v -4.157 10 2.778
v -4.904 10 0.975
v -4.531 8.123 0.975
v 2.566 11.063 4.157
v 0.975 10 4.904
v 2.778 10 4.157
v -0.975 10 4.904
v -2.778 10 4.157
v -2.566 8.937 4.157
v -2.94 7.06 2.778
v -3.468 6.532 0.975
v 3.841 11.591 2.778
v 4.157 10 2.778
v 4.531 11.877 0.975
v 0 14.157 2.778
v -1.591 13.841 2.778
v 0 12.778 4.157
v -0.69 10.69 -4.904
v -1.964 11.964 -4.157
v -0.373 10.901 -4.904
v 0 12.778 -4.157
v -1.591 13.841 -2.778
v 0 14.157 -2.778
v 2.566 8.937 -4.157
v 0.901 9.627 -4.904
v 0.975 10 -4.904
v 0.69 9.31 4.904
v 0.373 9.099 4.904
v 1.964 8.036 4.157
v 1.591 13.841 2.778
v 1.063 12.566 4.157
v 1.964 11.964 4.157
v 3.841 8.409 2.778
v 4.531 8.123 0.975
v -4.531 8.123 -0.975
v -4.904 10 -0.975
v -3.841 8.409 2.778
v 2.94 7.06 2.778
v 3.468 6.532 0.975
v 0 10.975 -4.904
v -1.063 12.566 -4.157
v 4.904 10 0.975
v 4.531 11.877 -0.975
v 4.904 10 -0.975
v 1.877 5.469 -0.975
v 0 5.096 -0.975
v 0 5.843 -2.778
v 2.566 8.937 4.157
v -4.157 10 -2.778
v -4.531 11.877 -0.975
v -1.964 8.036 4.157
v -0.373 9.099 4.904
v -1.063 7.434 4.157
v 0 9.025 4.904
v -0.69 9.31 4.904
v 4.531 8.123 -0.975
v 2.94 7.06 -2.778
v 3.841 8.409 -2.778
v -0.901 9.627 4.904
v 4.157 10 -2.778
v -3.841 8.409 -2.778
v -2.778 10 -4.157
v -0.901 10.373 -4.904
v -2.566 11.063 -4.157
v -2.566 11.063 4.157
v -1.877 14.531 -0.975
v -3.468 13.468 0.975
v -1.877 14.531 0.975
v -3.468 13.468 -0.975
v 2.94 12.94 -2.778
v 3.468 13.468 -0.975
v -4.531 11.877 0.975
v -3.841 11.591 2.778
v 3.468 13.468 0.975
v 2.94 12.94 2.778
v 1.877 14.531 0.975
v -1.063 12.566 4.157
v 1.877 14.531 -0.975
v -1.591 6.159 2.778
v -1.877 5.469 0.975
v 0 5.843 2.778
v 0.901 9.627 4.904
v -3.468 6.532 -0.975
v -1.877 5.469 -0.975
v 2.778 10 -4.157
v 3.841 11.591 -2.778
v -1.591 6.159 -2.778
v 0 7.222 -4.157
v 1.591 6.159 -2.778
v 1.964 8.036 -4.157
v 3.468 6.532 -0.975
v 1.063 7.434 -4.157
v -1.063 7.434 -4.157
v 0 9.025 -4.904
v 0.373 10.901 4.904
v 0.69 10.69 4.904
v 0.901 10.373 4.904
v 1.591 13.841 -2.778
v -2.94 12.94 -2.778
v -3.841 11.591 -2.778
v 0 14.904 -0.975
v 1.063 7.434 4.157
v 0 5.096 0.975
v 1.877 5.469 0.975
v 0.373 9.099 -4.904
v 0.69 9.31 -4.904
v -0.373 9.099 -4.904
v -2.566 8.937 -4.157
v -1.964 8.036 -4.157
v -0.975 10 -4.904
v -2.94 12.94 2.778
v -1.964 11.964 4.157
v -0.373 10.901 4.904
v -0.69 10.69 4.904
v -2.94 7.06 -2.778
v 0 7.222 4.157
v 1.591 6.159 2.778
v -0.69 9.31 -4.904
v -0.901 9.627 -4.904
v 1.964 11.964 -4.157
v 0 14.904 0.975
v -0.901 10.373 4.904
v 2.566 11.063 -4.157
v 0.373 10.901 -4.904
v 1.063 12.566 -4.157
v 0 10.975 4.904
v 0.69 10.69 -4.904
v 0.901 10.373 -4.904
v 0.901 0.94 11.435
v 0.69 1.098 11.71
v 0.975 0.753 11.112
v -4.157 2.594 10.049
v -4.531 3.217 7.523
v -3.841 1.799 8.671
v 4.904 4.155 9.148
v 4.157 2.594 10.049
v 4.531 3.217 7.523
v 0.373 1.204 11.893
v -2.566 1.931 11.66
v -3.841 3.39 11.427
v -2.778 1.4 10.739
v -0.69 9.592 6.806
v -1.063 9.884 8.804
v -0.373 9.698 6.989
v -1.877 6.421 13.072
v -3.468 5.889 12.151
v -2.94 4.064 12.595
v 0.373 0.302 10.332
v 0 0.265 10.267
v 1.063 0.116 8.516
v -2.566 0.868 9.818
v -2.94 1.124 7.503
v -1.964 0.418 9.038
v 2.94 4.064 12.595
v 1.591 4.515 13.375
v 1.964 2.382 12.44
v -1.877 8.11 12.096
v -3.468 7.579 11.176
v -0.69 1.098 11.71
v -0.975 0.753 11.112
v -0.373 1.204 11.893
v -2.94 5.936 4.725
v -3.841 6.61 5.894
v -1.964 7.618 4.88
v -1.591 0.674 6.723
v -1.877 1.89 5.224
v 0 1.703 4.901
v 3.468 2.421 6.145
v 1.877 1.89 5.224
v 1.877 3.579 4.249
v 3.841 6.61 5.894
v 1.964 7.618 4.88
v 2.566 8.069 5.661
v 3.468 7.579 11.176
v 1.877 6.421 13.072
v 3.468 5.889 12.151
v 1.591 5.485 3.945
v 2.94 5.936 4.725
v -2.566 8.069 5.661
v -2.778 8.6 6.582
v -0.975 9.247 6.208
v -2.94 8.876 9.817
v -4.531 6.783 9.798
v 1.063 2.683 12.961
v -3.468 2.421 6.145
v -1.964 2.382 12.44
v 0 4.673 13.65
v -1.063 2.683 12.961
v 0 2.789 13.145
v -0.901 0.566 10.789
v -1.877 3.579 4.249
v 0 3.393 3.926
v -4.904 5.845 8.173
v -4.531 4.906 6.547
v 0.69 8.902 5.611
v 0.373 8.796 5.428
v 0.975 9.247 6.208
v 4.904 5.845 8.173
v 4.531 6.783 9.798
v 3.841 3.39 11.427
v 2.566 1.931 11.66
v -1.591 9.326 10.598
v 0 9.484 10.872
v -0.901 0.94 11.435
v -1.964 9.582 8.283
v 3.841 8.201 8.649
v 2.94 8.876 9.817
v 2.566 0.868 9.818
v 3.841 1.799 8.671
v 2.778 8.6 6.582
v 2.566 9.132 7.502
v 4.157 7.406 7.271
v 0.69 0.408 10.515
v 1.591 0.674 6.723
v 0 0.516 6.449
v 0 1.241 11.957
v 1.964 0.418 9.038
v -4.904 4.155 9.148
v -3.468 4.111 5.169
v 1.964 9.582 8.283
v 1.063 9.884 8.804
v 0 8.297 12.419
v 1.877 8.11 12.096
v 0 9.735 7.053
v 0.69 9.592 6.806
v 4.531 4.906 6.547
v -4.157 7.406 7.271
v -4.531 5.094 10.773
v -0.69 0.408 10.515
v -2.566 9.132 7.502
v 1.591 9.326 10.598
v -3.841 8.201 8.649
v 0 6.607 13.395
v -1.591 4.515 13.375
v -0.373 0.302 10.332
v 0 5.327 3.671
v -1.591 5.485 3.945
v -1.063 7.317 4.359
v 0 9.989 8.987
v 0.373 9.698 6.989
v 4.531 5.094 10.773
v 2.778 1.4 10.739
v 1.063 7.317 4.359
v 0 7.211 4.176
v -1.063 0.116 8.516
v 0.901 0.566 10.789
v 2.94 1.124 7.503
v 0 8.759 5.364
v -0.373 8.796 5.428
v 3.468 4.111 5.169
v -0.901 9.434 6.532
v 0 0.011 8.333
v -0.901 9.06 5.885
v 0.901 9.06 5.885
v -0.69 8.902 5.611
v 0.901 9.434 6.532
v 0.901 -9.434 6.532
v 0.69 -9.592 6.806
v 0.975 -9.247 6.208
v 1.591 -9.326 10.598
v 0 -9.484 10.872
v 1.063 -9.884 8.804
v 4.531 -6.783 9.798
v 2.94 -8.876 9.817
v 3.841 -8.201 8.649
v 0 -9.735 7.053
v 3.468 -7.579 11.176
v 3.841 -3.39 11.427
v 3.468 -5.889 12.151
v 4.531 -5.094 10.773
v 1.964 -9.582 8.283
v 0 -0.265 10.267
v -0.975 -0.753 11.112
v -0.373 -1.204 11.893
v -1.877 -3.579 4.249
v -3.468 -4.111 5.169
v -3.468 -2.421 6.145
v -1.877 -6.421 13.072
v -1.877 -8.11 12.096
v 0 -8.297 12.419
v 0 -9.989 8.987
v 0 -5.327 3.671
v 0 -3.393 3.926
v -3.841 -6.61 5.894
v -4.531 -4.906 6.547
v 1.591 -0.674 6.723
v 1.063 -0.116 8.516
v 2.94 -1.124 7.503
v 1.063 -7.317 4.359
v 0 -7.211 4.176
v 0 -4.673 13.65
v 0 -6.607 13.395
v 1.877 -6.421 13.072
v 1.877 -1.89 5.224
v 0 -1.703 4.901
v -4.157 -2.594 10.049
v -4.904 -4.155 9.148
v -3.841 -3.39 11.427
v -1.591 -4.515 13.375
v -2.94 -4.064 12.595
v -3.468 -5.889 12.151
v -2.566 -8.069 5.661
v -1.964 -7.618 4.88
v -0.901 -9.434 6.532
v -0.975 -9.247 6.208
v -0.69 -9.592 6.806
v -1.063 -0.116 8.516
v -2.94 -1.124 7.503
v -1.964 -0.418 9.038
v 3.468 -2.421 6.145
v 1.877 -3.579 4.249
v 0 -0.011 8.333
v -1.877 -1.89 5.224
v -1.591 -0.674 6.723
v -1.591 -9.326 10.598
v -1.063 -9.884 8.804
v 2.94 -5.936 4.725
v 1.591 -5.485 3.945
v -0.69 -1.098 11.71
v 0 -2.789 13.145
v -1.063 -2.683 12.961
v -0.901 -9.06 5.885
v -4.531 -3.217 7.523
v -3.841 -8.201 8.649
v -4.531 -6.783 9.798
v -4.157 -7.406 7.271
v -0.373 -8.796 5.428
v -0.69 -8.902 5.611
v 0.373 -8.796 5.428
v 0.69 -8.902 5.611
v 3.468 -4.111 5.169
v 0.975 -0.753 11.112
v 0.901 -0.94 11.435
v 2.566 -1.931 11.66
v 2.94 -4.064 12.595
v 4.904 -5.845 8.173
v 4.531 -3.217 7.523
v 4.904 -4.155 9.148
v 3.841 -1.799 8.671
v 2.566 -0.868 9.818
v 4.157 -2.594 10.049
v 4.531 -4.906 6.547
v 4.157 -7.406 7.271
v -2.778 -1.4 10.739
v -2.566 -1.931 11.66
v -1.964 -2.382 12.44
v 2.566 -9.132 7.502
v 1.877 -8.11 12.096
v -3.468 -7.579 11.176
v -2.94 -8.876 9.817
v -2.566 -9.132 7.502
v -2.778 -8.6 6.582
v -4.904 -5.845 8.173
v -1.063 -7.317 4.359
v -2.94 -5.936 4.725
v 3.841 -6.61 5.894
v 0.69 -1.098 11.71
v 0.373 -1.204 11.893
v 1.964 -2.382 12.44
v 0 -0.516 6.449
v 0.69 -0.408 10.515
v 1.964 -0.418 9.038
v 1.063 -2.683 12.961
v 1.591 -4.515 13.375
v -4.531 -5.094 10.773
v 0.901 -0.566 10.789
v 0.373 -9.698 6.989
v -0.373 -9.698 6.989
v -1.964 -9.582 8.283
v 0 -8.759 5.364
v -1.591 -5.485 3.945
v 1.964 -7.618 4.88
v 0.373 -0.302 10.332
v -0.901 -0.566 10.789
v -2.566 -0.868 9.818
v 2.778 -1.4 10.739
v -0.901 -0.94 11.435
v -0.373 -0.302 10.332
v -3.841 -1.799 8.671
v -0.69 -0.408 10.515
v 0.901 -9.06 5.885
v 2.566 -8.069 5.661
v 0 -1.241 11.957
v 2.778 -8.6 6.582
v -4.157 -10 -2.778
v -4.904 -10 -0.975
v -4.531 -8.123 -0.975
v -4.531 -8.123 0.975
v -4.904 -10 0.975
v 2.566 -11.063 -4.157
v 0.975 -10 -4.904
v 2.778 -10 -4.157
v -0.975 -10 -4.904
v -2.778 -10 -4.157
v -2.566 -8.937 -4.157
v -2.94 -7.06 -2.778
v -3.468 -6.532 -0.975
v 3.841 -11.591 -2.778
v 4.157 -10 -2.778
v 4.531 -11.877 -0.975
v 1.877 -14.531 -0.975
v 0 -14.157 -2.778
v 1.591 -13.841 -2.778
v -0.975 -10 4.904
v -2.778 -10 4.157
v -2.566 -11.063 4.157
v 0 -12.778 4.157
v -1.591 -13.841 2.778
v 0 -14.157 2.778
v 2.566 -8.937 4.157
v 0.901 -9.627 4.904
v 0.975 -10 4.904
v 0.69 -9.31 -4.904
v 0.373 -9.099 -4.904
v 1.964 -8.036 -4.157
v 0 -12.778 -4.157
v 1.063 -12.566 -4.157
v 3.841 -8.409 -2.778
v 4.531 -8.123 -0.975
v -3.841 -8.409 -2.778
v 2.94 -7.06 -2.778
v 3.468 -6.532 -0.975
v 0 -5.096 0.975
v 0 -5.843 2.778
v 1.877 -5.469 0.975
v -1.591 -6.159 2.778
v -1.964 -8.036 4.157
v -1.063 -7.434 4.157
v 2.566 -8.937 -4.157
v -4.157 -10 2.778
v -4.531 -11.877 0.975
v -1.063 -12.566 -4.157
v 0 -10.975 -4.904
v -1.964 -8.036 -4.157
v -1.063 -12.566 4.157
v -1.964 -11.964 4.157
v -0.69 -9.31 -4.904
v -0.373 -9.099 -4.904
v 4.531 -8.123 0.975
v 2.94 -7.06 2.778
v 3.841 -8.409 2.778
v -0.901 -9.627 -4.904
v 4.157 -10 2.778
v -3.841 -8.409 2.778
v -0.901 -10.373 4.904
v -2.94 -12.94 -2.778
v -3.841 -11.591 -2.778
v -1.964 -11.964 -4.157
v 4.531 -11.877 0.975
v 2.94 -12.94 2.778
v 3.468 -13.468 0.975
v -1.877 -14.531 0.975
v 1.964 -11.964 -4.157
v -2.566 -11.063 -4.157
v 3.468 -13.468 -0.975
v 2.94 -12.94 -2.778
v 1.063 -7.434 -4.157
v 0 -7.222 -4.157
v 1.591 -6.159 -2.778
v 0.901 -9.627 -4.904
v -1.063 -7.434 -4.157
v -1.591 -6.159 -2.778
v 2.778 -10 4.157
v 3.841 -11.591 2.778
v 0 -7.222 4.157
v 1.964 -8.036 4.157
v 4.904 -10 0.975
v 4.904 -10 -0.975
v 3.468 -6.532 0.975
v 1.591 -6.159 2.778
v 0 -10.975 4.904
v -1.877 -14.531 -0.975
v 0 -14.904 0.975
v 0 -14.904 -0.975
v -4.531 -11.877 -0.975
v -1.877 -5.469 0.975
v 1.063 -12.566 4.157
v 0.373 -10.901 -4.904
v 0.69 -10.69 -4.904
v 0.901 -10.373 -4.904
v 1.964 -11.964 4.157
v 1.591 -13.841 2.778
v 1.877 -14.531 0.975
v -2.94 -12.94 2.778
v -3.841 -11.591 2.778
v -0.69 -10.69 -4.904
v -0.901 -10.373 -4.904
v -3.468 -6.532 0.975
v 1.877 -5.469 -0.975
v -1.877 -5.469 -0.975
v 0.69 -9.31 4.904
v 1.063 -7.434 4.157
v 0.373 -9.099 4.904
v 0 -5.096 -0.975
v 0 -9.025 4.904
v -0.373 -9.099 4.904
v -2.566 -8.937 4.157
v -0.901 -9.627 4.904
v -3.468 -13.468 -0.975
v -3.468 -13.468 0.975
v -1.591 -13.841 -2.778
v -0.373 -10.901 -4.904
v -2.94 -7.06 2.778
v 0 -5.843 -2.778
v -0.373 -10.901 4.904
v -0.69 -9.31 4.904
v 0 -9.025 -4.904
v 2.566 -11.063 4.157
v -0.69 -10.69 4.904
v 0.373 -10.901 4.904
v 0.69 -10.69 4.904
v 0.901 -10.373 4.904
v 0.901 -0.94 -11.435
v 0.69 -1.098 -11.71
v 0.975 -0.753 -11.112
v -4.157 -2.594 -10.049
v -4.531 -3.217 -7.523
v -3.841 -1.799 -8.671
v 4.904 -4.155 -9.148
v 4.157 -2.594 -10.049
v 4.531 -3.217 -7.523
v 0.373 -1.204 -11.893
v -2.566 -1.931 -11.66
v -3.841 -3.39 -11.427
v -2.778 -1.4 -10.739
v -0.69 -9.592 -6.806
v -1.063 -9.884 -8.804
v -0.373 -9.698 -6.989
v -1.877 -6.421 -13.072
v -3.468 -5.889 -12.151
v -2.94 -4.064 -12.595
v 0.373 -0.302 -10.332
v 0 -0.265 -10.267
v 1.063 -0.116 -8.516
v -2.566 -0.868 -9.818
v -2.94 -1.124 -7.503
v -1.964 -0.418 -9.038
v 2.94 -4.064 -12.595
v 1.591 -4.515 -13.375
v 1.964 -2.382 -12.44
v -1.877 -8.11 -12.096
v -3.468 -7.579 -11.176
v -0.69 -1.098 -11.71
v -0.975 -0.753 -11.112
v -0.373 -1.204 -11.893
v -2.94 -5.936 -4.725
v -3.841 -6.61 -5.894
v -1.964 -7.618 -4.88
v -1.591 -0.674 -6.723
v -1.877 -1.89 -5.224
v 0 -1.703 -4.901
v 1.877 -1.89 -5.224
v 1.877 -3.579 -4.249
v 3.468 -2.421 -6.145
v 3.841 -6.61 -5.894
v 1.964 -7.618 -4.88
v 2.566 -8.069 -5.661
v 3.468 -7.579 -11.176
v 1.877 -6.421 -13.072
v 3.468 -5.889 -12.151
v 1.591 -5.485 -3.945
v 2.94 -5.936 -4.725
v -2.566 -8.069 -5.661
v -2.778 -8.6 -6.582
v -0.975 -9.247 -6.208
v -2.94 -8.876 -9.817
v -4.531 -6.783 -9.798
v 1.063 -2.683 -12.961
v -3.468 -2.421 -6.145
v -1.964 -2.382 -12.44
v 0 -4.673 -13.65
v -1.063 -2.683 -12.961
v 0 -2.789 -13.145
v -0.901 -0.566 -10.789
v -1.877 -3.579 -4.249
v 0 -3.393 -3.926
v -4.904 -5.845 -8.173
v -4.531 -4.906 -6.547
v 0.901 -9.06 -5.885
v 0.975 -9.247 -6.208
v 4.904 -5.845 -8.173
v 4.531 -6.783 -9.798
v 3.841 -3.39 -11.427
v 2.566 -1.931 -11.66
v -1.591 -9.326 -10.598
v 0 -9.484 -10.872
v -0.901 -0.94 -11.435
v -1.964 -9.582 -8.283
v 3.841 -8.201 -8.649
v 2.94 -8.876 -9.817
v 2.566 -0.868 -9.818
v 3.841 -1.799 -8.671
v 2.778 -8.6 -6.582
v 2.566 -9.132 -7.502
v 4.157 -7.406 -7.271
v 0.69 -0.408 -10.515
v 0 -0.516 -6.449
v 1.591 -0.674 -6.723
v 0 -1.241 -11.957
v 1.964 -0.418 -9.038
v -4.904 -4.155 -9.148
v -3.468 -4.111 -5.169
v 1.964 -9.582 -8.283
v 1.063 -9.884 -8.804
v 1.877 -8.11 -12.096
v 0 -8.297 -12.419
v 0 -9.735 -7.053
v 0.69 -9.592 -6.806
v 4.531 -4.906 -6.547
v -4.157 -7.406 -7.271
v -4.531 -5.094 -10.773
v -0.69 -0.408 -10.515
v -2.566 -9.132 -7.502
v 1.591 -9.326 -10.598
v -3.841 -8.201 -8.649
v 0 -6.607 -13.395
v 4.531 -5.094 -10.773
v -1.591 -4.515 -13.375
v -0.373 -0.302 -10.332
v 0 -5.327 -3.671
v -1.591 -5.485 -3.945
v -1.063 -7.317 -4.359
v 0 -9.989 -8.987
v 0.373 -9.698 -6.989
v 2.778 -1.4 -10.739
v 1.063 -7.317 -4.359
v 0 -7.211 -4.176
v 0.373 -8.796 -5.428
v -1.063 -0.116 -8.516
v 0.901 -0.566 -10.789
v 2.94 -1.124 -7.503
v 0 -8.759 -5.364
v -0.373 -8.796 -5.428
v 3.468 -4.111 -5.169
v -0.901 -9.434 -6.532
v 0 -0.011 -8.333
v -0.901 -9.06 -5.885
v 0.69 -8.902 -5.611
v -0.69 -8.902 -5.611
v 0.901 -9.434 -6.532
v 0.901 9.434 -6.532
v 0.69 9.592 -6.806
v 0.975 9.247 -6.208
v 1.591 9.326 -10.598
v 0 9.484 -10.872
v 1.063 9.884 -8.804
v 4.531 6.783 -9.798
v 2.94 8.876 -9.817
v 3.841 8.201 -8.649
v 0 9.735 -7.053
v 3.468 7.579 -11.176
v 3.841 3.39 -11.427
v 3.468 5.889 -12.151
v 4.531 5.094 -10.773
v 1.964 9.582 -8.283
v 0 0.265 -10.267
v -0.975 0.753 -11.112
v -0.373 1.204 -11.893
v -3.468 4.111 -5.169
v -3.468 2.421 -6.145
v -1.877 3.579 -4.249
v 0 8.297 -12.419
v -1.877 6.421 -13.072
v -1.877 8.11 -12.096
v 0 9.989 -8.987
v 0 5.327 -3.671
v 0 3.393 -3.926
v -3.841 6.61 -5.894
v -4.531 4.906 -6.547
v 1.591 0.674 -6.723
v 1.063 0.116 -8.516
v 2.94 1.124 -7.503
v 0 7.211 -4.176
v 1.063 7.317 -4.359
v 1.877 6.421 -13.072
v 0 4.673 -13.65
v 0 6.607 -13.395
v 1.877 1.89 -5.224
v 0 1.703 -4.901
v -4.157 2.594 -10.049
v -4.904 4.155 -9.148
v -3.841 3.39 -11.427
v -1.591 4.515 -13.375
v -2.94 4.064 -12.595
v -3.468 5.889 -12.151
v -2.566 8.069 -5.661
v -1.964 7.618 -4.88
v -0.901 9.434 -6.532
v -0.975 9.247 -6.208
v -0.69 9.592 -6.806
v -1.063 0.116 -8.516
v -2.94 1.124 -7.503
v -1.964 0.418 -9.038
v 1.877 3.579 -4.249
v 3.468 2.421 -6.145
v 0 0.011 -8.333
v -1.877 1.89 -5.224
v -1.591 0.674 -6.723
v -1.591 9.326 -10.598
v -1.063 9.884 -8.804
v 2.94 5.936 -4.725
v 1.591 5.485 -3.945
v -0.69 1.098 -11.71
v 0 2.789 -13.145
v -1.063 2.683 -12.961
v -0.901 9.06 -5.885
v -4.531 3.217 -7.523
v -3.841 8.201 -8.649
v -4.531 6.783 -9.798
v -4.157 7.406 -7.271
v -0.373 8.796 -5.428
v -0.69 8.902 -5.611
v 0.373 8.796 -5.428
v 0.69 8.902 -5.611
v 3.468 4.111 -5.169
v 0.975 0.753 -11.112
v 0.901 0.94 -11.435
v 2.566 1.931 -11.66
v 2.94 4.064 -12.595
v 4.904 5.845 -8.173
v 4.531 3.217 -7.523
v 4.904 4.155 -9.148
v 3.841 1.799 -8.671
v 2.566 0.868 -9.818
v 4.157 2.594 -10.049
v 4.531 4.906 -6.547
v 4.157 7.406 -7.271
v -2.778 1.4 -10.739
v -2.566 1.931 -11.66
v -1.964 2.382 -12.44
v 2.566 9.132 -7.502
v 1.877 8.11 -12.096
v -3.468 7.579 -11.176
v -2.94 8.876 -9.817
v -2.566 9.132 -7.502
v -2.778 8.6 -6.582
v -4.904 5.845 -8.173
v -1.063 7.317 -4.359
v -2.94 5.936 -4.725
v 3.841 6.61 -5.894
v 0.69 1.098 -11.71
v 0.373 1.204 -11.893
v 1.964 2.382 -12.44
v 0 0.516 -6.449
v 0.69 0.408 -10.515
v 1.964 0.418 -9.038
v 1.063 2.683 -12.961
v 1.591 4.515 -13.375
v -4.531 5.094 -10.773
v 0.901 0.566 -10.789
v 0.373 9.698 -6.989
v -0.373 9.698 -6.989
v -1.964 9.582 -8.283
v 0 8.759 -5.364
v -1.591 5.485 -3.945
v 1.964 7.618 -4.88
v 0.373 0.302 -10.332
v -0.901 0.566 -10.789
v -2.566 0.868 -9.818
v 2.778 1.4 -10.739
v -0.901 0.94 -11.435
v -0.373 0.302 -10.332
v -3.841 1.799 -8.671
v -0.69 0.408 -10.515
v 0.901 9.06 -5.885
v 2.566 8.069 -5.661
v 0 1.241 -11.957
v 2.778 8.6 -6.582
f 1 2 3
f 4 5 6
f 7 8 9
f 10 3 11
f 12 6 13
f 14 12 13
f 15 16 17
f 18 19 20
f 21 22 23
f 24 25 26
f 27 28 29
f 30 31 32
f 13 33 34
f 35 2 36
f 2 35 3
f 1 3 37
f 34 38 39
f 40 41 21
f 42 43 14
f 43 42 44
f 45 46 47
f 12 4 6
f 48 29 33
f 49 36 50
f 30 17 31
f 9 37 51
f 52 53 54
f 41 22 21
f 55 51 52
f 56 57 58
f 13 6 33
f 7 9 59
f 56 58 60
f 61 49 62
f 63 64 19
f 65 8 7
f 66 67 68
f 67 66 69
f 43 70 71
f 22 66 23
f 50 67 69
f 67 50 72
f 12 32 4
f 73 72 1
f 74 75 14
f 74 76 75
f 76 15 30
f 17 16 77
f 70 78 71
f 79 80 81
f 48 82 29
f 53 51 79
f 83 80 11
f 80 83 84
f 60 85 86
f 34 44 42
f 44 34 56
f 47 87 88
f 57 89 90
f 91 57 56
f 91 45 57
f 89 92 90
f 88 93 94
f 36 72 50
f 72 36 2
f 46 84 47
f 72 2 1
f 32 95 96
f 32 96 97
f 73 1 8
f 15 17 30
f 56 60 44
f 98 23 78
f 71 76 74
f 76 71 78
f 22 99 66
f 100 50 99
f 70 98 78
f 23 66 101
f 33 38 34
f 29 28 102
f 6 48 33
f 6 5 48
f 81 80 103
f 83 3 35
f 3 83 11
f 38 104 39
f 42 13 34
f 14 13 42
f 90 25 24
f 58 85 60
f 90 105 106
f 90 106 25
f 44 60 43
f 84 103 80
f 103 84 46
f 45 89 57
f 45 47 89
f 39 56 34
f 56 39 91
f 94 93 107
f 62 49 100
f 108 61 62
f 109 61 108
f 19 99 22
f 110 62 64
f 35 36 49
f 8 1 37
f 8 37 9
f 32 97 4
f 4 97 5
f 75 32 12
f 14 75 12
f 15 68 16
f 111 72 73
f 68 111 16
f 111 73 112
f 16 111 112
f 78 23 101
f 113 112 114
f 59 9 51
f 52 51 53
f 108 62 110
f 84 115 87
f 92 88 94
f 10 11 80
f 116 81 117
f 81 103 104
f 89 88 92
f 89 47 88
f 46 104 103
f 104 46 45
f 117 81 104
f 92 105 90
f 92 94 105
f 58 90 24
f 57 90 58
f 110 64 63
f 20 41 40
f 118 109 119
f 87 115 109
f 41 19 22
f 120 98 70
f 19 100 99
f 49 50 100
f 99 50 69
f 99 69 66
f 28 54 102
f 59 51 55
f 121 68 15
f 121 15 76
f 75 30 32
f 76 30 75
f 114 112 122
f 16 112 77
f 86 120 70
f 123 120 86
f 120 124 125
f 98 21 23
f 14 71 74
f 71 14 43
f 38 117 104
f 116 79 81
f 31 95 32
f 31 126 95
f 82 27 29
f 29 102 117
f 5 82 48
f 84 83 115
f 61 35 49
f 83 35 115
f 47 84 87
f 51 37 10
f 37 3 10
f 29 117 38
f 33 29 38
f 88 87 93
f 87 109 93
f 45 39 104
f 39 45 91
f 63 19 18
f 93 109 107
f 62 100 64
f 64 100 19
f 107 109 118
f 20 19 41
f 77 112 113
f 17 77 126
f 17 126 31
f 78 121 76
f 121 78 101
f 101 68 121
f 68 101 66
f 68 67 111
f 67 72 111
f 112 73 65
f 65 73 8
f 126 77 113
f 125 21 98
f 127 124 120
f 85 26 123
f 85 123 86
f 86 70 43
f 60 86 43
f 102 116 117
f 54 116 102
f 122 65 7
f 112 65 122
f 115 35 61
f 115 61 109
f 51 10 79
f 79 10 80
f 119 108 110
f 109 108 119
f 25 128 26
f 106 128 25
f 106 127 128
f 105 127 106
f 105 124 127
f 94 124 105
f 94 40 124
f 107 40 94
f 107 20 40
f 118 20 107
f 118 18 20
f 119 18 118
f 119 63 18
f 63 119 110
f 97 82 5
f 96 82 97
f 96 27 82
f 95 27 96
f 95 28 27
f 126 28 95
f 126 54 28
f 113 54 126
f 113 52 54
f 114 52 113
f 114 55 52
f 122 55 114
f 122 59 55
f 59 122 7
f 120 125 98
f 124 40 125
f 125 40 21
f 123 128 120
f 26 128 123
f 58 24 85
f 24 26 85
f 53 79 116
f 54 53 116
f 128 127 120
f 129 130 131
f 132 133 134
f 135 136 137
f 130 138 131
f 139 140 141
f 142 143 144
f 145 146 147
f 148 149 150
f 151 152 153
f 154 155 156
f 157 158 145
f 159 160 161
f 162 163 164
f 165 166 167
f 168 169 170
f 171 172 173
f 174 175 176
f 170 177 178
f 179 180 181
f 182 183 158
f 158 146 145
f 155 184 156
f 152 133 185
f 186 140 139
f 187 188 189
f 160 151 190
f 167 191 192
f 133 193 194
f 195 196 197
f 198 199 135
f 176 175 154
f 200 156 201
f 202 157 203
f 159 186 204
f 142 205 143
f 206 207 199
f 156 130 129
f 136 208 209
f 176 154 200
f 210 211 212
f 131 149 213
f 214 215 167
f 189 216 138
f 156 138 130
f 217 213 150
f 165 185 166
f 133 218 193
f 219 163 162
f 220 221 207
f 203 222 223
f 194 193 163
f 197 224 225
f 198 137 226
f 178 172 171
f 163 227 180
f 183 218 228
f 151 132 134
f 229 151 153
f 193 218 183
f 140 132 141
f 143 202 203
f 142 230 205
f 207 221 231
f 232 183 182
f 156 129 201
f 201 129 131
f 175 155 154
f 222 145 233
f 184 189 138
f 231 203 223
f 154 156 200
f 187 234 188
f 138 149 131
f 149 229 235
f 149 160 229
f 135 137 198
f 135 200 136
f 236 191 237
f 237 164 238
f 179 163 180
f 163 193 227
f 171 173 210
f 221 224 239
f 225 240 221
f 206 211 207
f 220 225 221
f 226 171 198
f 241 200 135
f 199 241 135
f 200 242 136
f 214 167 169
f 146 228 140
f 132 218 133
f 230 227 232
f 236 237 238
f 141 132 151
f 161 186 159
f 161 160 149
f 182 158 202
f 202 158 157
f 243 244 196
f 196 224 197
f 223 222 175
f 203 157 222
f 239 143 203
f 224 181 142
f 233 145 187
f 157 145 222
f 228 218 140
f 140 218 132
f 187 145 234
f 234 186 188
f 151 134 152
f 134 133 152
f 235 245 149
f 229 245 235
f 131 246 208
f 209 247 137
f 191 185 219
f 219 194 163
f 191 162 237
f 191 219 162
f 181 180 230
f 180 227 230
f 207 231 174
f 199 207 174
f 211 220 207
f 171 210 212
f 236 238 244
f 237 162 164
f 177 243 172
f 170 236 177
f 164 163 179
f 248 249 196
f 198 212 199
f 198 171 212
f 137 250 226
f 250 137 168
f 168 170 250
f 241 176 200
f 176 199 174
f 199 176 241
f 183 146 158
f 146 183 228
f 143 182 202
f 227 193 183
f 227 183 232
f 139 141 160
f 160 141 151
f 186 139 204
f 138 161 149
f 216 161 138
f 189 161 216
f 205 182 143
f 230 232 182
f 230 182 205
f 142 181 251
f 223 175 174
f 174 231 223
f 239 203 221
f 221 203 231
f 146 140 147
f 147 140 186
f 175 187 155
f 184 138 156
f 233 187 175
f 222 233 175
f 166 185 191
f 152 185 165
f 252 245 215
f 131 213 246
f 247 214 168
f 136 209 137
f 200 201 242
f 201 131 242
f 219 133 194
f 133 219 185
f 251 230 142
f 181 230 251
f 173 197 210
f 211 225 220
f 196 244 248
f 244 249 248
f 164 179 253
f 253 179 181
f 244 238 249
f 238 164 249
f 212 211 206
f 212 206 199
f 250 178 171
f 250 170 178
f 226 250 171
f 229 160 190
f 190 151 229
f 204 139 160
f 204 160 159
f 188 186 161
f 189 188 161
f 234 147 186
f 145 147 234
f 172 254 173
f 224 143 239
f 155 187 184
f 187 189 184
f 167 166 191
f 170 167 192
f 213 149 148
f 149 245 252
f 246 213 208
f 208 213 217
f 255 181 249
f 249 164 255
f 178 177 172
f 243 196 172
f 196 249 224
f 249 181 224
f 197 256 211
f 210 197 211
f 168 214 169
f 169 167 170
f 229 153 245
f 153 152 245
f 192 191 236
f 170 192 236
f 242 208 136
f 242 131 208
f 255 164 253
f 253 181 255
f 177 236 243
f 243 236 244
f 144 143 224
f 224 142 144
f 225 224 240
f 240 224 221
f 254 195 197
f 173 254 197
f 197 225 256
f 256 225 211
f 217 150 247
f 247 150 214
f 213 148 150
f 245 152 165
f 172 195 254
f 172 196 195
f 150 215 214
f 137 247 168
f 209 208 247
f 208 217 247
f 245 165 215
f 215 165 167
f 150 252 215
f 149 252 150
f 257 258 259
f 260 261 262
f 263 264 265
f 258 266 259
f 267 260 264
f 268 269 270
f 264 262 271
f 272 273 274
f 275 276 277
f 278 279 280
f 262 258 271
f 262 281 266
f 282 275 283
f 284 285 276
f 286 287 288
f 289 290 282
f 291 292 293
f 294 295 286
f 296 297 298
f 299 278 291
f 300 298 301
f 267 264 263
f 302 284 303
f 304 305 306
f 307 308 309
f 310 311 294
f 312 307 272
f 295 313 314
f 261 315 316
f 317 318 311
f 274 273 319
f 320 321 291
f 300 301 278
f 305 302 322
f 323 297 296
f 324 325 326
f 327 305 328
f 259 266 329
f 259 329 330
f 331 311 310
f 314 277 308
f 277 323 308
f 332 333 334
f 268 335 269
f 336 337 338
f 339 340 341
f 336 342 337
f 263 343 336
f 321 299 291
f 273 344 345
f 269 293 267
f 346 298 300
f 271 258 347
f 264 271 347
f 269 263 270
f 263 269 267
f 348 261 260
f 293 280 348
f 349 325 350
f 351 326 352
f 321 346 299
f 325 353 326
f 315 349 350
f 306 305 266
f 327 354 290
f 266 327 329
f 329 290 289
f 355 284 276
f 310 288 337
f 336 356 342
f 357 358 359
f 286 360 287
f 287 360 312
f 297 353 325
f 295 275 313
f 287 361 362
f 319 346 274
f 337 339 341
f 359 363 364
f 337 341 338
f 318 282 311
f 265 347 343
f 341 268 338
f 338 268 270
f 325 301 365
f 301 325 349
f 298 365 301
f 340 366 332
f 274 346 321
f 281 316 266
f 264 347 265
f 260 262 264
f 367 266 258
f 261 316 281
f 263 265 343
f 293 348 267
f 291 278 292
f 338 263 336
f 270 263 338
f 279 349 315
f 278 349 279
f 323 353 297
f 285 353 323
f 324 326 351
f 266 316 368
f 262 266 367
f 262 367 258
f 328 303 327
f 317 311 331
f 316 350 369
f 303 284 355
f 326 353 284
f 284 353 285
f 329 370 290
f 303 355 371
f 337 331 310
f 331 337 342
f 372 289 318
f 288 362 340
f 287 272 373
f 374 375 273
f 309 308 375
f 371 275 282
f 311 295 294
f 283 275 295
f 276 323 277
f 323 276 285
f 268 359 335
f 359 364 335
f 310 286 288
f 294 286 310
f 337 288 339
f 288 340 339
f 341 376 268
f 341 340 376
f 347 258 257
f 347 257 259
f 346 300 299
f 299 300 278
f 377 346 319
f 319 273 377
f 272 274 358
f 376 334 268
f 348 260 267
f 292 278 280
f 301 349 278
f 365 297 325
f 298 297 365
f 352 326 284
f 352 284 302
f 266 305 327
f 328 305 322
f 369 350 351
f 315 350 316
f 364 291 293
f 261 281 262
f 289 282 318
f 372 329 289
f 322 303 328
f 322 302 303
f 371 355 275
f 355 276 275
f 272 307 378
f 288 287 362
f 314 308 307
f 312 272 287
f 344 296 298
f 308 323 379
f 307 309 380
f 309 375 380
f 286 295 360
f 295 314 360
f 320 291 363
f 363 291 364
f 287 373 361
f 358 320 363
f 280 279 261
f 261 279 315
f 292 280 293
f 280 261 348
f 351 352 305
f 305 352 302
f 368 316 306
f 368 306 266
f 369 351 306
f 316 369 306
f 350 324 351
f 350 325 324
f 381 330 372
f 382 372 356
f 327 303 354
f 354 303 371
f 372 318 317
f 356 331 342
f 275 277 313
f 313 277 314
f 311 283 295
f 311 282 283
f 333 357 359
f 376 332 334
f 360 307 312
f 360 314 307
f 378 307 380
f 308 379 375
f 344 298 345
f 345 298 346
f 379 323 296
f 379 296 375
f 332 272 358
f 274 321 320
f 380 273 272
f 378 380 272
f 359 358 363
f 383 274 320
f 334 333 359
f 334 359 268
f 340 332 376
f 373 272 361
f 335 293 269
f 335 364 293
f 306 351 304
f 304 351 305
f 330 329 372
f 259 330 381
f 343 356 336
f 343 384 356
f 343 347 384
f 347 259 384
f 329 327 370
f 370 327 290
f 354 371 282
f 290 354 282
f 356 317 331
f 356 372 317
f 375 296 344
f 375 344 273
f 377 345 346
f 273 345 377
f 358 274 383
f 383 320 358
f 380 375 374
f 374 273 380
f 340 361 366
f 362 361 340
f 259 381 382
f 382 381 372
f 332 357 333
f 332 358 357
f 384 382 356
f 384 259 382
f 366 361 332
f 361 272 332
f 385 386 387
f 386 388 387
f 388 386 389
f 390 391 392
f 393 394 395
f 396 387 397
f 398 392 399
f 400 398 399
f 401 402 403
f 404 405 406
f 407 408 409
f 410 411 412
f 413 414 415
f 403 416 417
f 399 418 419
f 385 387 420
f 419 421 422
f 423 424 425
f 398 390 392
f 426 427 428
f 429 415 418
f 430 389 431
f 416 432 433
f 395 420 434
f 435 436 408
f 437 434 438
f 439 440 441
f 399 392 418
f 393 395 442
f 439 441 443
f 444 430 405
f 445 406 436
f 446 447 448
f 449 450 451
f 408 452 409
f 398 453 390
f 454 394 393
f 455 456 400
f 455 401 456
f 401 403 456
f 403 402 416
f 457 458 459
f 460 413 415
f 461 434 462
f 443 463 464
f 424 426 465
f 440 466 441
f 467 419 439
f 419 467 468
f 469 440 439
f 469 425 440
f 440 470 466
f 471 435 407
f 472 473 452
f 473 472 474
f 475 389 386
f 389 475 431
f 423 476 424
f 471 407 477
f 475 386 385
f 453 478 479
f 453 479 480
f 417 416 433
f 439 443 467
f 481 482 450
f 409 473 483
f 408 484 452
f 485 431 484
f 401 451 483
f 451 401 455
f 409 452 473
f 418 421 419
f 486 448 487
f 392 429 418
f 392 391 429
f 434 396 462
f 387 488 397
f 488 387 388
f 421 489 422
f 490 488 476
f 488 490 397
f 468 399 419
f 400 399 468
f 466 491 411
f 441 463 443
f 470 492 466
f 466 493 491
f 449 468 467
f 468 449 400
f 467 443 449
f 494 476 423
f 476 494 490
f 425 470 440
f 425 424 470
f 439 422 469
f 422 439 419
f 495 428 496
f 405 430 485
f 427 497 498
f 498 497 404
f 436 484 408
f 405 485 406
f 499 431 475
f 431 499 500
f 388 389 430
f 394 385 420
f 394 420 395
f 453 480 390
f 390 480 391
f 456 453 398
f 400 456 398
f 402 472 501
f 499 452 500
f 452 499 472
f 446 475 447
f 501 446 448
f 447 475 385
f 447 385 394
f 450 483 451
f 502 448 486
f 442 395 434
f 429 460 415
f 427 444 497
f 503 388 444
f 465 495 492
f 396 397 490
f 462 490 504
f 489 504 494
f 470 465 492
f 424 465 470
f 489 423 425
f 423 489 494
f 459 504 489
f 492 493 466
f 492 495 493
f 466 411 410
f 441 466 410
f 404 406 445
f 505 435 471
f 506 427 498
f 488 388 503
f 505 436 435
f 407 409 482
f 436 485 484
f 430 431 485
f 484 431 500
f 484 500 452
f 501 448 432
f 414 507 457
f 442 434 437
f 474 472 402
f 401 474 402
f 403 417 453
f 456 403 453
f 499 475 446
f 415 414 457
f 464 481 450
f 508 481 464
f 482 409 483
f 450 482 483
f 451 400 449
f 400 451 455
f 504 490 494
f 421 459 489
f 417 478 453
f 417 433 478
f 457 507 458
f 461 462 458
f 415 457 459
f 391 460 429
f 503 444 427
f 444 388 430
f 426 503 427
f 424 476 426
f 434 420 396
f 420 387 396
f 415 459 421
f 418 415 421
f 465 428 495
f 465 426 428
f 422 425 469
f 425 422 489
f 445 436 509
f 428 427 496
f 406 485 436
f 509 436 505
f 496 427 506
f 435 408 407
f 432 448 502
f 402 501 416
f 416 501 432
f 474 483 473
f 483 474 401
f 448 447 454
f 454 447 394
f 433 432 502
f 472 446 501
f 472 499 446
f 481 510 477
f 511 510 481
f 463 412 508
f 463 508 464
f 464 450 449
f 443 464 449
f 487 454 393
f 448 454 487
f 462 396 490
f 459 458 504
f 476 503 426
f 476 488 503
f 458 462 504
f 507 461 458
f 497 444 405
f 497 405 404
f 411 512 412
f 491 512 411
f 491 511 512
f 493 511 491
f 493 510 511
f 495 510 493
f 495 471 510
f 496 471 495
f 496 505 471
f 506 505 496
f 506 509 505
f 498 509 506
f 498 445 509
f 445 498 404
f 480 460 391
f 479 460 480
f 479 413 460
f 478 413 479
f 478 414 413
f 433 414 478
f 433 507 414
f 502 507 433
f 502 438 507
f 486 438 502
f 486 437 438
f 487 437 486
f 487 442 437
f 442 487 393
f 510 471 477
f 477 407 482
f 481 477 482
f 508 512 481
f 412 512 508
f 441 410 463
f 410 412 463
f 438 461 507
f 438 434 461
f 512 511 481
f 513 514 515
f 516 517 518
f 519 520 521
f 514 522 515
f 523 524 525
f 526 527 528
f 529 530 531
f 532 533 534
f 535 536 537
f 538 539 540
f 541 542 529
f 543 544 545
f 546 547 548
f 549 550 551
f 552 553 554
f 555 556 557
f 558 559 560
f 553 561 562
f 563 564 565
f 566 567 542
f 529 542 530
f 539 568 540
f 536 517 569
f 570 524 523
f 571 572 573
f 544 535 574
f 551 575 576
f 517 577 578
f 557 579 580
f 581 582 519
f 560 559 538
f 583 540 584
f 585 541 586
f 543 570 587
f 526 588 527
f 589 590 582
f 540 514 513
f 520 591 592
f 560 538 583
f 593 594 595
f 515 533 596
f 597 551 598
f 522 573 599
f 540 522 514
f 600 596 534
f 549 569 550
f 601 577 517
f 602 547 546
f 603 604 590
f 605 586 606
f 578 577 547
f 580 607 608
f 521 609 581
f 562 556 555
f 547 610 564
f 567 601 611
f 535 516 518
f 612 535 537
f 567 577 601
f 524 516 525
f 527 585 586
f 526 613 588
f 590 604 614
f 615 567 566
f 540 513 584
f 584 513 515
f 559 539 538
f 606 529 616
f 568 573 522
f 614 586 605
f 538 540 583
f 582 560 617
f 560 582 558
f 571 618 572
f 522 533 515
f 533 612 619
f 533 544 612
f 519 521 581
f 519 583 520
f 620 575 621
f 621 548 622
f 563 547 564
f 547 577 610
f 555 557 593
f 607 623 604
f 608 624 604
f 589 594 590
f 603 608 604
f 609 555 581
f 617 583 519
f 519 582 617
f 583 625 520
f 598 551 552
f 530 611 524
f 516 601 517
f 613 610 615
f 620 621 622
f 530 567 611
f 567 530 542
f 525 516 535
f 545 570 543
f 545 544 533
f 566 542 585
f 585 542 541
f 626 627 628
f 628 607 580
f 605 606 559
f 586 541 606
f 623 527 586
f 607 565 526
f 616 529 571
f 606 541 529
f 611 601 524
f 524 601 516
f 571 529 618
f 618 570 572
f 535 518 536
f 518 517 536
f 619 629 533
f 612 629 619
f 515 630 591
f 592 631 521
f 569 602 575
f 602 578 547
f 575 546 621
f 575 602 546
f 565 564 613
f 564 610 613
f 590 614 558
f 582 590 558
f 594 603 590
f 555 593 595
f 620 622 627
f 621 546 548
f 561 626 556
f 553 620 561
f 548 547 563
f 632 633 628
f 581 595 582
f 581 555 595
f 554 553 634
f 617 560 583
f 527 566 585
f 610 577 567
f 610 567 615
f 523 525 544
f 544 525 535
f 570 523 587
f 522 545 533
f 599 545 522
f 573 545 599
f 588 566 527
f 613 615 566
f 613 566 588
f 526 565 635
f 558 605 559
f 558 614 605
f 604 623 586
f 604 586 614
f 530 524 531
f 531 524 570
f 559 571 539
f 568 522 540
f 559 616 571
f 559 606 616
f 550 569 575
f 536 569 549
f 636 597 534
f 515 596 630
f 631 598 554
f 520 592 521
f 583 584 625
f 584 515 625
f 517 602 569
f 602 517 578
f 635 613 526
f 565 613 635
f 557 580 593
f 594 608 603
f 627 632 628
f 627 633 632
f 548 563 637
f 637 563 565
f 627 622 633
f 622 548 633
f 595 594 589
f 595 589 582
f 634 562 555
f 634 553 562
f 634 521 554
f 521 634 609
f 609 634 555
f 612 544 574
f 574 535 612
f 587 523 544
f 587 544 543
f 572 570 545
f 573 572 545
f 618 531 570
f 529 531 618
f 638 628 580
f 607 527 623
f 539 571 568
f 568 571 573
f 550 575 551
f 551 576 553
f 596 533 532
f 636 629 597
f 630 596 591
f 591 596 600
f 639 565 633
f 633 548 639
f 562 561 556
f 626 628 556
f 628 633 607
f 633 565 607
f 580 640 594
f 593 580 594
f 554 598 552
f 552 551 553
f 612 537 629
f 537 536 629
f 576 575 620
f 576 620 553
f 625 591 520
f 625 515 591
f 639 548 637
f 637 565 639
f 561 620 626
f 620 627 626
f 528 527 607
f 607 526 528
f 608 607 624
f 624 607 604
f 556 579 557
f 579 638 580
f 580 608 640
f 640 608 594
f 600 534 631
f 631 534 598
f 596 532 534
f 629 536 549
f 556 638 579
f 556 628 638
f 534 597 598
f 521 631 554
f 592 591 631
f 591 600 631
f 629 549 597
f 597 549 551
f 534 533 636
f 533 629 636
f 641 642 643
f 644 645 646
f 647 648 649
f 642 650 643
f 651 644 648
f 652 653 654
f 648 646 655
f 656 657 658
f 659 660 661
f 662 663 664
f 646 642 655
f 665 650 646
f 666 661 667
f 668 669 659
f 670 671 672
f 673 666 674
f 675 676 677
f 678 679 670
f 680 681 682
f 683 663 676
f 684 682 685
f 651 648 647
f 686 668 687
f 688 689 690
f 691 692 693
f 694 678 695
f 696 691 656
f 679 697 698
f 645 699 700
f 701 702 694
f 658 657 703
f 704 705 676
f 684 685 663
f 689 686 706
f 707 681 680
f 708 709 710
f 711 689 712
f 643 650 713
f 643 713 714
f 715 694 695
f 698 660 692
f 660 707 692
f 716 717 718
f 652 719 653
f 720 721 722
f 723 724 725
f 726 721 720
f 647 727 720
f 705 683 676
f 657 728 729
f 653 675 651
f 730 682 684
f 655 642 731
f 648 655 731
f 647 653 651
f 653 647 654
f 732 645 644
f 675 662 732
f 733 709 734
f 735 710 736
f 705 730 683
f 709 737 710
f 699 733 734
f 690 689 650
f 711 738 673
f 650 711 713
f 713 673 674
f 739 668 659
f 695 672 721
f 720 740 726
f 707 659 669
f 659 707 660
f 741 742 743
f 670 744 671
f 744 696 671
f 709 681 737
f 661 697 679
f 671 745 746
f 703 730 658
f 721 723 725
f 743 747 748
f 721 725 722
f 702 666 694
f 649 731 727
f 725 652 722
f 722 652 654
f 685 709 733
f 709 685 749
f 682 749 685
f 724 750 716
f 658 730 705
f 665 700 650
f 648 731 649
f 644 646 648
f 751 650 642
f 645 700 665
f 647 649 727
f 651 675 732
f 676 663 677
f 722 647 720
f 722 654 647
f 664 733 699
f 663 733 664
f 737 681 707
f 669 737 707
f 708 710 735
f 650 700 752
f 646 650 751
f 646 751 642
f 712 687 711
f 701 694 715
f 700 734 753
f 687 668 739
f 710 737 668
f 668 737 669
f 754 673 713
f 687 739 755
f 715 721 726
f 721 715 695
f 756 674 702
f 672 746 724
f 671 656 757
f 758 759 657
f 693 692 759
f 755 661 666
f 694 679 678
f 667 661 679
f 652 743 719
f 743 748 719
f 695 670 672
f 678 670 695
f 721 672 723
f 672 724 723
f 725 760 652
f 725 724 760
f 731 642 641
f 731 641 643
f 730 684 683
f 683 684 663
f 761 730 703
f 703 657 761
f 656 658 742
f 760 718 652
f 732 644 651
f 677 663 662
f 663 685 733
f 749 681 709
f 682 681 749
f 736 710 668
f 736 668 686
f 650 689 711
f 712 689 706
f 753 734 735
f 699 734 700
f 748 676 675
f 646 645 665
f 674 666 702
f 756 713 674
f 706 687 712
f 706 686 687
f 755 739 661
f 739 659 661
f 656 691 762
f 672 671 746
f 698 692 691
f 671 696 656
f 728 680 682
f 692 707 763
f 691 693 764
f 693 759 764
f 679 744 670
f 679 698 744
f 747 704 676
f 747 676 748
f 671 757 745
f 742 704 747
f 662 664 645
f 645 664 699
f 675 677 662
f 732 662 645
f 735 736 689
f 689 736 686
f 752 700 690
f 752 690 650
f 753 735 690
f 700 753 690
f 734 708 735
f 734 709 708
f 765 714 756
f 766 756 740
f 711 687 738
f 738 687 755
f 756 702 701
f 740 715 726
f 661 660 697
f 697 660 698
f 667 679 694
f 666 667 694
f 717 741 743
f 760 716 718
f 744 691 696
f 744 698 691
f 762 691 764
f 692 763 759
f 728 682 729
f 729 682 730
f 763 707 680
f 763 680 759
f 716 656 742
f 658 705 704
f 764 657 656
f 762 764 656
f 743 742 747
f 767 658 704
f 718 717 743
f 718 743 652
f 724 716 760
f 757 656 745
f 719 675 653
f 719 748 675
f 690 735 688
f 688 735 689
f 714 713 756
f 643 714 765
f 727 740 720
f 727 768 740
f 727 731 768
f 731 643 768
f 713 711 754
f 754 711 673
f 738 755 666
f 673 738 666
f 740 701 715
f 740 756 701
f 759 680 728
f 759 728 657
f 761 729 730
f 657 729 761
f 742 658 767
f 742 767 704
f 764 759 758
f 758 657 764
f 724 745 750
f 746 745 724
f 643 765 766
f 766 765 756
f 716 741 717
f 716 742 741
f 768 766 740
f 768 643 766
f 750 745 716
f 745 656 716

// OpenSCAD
for (i = [0:5]) {
	rotate(i*360/6, [1, 0, 0])
	translate([0, 10, 0])
	sphere(r=5);
}
